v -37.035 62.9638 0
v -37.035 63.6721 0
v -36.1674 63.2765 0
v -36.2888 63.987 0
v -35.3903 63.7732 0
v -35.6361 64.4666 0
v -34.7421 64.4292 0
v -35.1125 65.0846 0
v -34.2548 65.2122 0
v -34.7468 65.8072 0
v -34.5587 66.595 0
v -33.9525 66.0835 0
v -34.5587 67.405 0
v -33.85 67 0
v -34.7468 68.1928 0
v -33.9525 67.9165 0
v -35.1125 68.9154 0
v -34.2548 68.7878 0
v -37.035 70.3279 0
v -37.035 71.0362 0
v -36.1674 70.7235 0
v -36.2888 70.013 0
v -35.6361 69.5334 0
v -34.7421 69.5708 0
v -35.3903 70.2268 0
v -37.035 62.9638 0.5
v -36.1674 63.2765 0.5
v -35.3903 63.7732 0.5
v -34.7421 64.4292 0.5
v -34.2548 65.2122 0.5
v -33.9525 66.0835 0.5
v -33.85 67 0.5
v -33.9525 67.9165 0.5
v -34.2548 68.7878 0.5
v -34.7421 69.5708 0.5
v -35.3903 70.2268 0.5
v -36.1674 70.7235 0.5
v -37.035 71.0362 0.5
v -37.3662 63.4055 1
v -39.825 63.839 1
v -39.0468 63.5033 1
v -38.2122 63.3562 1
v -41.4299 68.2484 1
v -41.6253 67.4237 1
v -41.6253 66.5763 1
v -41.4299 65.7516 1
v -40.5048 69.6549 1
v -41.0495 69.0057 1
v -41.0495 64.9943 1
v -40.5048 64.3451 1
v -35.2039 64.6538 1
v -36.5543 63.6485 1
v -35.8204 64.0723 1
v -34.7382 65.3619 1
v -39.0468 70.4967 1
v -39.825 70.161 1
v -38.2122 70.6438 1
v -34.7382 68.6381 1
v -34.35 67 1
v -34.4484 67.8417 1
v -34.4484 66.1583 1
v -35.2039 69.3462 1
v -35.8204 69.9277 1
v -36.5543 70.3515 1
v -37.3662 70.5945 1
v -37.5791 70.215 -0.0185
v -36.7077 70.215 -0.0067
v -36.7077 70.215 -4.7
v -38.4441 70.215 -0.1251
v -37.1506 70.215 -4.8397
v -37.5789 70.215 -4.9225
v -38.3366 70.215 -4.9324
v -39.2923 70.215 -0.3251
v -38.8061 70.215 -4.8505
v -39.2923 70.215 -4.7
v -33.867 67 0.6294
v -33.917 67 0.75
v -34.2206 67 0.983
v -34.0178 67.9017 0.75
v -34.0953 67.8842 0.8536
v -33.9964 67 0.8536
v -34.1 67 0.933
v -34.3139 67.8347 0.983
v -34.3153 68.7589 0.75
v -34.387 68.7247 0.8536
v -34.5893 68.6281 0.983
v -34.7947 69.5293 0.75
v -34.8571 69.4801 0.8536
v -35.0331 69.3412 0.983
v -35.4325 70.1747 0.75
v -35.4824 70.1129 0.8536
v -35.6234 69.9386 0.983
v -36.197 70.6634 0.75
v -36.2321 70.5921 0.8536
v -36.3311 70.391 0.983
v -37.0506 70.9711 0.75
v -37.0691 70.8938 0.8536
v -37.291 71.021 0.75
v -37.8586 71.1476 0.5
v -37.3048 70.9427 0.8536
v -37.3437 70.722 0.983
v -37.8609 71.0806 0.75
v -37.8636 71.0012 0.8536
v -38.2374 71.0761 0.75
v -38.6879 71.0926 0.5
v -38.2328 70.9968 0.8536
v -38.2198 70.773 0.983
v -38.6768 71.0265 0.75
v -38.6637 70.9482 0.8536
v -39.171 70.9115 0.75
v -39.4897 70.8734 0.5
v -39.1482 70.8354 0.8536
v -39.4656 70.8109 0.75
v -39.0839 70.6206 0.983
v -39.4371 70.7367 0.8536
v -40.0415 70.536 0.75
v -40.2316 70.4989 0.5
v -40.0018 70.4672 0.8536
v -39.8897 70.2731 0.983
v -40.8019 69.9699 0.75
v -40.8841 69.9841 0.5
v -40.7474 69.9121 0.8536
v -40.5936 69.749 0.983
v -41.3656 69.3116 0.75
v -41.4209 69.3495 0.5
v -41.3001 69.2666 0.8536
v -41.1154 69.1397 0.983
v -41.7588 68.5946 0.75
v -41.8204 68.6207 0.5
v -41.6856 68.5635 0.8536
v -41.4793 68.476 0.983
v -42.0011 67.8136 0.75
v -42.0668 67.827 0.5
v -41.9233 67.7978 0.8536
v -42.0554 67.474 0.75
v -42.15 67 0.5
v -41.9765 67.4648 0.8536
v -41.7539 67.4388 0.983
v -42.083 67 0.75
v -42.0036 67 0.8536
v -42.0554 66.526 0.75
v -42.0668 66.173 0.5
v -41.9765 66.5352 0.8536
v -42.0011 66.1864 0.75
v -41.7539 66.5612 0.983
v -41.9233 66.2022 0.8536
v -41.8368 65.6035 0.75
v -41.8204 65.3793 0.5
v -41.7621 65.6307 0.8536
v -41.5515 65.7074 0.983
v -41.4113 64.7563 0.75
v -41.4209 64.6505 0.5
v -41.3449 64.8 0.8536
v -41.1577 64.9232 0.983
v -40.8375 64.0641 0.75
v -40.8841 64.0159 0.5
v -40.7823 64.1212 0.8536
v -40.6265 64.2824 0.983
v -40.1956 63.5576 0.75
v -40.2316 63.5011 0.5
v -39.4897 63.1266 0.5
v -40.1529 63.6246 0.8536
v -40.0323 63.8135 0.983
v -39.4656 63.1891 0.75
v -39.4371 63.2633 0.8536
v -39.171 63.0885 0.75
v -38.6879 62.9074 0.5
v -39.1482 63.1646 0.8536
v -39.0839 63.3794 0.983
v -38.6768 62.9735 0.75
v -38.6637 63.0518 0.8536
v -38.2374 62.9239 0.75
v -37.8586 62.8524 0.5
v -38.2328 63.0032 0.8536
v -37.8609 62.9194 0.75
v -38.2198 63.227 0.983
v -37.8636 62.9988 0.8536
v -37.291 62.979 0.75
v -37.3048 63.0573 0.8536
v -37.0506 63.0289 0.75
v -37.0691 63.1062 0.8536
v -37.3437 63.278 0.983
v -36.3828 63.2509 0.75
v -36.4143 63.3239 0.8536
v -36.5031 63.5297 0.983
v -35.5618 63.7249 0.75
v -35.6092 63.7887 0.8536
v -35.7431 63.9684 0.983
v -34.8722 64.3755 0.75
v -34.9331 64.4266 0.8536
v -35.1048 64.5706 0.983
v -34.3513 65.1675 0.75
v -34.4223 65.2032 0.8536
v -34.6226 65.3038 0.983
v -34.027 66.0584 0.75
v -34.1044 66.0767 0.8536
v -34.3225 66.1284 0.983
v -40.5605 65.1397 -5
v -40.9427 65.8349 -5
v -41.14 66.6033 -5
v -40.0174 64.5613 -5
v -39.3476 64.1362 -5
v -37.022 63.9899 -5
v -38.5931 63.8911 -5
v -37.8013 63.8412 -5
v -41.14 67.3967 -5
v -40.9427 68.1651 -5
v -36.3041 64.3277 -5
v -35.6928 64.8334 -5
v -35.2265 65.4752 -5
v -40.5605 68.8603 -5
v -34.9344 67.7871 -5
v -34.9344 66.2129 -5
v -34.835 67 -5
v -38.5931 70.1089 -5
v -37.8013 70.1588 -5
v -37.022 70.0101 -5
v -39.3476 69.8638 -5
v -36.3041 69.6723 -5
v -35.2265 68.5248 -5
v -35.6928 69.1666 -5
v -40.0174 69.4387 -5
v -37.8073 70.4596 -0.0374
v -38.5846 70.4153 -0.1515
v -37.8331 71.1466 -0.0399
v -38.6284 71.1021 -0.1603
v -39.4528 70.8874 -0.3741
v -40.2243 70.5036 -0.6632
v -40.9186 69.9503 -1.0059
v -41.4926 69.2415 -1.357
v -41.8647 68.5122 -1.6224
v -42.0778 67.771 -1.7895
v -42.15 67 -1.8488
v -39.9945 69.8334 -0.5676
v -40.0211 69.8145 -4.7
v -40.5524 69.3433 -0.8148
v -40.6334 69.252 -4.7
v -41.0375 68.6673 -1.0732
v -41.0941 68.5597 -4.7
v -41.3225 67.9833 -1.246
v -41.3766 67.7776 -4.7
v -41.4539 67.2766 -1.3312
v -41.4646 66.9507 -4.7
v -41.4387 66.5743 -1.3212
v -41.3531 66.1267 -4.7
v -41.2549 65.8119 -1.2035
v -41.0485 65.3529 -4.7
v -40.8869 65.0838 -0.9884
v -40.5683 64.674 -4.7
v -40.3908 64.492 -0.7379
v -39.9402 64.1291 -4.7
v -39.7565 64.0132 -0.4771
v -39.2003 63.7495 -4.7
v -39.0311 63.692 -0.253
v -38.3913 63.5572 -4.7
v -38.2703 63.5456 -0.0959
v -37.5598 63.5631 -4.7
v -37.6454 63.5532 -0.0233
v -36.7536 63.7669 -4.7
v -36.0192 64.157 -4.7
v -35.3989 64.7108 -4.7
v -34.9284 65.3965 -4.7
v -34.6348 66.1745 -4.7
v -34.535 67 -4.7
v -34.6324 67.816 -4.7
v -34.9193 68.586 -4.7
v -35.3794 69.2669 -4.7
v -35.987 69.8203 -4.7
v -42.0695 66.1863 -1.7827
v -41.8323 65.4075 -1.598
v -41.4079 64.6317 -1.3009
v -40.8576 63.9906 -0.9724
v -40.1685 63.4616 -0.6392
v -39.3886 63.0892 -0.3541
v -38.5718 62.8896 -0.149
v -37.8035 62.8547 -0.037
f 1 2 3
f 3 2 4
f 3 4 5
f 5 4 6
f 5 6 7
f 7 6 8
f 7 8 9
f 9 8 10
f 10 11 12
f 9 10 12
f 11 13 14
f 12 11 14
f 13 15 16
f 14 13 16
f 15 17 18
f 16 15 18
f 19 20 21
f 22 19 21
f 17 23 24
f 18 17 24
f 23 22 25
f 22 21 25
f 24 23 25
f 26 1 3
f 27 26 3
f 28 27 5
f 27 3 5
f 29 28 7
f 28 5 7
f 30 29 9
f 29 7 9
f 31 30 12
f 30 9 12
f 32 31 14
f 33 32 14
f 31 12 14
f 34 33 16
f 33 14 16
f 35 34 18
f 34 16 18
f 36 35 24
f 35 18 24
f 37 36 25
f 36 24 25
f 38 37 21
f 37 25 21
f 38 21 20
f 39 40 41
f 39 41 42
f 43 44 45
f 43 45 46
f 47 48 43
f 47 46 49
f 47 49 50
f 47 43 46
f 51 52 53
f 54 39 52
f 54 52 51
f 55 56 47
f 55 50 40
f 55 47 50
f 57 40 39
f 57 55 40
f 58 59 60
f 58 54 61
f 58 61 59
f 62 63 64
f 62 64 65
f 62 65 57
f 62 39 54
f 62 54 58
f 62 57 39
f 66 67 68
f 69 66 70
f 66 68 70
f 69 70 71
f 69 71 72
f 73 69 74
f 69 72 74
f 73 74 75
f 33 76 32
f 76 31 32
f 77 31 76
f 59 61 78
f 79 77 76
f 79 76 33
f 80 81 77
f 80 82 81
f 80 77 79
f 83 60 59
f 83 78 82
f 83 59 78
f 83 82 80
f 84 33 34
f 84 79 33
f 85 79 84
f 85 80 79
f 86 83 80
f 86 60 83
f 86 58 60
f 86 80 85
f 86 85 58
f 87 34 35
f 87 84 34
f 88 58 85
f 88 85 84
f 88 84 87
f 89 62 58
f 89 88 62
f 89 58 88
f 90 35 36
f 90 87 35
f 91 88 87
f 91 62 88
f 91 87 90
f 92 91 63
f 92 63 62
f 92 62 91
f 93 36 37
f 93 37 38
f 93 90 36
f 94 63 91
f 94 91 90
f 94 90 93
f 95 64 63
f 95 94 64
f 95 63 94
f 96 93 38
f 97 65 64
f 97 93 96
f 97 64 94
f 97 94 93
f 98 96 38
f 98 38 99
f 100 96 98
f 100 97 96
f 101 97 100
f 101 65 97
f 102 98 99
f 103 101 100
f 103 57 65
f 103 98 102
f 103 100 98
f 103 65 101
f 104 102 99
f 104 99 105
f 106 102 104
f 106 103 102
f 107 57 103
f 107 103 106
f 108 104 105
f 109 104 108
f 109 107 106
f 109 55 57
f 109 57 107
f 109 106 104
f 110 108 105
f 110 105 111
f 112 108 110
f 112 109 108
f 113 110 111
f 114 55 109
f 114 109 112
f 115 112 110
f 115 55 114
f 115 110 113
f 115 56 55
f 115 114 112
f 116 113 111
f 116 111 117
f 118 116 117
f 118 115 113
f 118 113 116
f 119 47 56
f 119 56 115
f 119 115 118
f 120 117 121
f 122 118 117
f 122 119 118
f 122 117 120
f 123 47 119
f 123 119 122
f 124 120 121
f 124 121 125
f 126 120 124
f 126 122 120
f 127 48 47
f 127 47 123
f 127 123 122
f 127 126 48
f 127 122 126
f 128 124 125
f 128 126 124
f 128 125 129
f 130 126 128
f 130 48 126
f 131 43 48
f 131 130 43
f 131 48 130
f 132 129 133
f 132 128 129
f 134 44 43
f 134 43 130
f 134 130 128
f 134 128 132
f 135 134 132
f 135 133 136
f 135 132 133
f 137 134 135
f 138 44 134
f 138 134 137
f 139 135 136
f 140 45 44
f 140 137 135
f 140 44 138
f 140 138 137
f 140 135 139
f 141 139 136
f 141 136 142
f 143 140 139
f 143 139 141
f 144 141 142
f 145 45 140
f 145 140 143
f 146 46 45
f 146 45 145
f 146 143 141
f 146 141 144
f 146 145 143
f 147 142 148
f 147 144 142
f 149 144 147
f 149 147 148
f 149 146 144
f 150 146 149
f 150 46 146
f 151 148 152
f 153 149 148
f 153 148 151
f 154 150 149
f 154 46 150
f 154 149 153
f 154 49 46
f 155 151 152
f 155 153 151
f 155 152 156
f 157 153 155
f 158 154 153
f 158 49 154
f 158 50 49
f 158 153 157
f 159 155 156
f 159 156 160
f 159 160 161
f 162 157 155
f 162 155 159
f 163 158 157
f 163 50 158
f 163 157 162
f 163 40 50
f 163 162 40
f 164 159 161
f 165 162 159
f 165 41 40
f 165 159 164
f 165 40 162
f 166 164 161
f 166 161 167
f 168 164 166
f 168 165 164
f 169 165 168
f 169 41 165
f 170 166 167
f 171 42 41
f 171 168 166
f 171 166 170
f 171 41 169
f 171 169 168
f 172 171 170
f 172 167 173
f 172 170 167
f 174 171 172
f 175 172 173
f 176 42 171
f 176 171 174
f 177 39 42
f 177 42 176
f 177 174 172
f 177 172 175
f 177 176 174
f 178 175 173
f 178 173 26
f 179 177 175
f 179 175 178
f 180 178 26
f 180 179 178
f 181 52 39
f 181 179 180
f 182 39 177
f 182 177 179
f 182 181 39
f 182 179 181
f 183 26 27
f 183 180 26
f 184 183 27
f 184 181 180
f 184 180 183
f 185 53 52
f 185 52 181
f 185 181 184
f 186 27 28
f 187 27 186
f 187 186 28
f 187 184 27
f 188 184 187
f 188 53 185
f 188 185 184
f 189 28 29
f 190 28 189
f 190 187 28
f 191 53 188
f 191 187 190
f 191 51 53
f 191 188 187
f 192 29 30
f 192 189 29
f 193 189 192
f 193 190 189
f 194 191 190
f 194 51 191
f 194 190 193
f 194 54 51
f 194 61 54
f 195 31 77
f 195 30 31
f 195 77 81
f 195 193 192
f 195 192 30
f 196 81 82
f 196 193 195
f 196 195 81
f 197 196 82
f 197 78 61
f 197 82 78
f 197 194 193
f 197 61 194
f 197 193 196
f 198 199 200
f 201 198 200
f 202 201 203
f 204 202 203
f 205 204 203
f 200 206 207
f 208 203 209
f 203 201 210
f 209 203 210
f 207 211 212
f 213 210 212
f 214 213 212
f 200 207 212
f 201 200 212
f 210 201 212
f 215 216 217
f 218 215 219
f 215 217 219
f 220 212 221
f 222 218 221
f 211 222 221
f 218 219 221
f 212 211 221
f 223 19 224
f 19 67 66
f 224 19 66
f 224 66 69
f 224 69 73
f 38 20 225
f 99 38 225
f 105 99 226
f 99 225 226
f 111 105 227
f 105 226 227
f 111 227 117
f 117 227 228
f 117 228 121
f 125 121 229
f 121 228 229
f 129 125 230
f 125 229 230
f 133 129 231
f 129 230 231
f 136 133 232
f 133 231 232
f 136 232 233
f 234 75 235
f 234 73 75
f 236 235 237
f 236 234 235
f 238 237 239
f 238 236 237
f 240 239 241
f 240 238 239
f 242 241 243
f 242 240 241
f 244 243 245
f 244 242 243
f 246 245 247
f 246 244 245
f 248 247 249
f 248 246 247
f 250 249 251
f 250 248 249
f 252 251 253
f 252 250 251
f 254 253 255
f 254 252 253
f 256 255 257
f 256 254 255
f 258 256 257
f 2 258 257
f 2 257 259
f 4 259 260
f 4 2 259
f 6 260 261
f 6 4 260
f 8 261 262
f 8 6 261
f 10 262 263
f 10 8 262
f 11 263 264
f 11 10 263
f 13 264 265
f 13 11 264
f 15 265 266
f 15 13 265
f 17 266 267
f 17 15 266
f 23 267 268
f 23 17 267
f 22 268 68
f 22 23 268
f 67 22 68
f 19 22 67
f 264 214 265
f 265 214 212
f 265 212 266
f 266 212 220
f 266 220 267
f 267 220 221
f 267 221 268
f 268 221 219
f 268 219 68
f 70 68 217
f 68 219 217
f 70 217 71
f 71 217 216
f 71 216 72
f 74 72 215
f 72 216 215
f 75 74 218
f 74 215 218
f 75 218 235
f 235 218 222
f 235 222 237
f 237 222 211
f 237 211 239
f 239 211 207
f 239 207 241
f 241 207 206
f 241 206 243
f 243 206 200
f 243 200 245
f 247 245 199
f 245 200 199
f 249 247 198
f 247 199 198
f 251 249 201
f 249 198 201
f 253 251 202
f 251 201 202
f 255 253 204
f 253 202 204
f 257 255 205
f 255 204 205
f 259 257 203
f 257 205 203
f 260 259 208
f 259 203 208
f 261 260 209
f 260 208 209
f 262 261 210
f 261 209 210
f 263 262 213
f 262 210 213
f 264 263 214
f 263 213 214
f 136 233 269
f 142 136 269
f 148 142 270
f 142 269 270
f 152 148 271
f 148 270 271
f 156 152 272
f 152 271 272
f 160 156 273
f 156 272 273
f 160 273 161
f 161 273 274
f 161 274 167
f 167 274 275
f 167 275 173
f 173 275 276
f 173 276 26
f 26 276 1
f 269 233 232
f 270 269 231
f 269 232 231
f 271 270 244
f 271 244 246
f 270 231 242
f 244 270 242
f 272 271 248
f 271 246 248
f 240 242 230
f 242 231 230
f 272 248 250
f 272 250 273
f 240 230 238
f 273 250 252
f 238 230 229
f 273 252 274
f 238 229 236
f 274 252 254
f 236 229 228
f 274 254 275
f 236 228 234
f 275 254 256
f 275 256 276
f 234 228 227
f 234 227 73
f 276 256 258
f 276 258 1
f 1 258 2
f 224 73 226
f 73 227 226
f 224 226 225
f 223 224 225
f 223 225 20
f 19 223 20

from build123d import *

# Parameters (mm, degrees)
ESQUISSE1_R                  = 3.465
BOSS_EXTRU_1_DEPTH           = 5
ESQUISSE2_R                  = 4.15
BOSS_EXTRU_2_DEPTH           = 1
CONG_1_R                     = 0.5
BOSS_EXTRU_3_DEPTH           = 9
BOSS_EXTRU_3_DEPTH_BACK      = 2
ENL_V_START                  = -4
ENL_V_MAT_EXTRU_1_DEPTH      = 4
CHANFREIN1_SIZE              = 0.3
ENL_V_MAT_EXTRU_2_REACH      = 84.915
ENL_V_MAT_EXTRU_2_END_RADIUS = 8


with BuildPart() as part:
    # Esquisse1 → Boss.-Extru.1 (new body)
    with BuildSketch(Plane.XY):
        with Locations((-38, 67)):
            Circle(ESQUISSE1_R)
    extrude(amount=-BOSS_EXTRU_1_DEPTH)

    # Esquisse2 → Boss.-Extru.2 (add)
    with BuildSketch(Plane.XY):
        with Locations((-38, 67)):
            Circle(ESQUISSE2_R)
    extrude(amount=BOSS_EXTRU_2_DEPTH)

    # Congé1
    cong_1_edges = [part.edges().sort_by_distance(p)[0] for p in [
        (-42.15, 67, 1),
    ]]
    fillet(cong_1_edges, radius=CONG_1_R)

    # Esquisse4 → Boss.-Extru.3 (add, two sides: drawn at the far end of the back side and taken through both)
    with BuildSketch(Plane(origin=(29.785, 71.15, 0), x_dir=(0, 0, 1), z_dir=(0, -1, 0)).offset(-BOSS_EXTRU_3_DEPTH_BACK)):
        with BuildLine():
            Line((0, 71.935), (-1.84883954, 71.935))
            ThreePointArc((-1.84883954, 71.935), (-0.476394359, 69.539440781), (0, 66.82))
            Line((0, 66.82), (0, 71.935))
        make_face()
    extrude(amount=BOSS_EXTRU_3_DEPTH + BOSS_EXTRU_3_DEPTH_BACK)

    # Esquisse5 → Enlèv. mat.-Extru.1 (cut)
    with BuildSketch(Plane.XY.offset(1).offset(ENL_V_START)):
        with BuildLine():
            Line((-37.035, 62.963754839), (-36.628505561, 58.672971398))
            Line((-36.628505561, 58.672971398), (-43.808246532, 59.466119951))
            Line((-43.808246532, 59.466119951), (-42.997006725, 73.486489438))
            Line((-42.997006725, 73.486489438), (-36.628505561, 73.524507843))
            Line((-36.628505561, 73.524507843), (-37.035, 71.036245161))
            ThreePointArc((-37.035, 71.036245161), (-40.57077323, 70.25785589), (-42.15, 67))
            ThreePointArc((-42.15, 67), (-40.57077323, 63.74214411), (-37.035, 62.963754839))
        make_face()
    extrude(amount=ENL_V_MAT_EXTRU_1_DEPTH, mode=Mode.SUBTRACT)

    # Chanfrein1
    chanfrein1_edges = [part.edges().sort_by_distance(p)[0] for p in [
        (-41.465, 67, -5),
    ]]
    chamfer(chanfrein1_edges, length=CHANFREIN1_SIZE)

    # Enlèv. mat.-Extru.2: up to this cylinder (the profile starts inside it)
    enl_v_mat_extru_2_end = Plane(origin=(-37.035, 70.315316, -8), z_dir=(0, -1, 0)) * Cylinder(ENL_V_MAT_EXTRU_2_END_RADIUS, 186.83, mode=Mode.PRIVATE)
    # Esquisse7 → Enlèv. mat.-Extru.2 (cut, up to the surface)
    with BuildSketch(Plane(origin=(0, 0, -5), x_dir=(-1, 0, 0), z_dir=(0, 0, -1)), mode=Mode.PRIVATE) as enl_v_mat_extru_2_sk1:
        with BuildLine():
            Line((36.707715202, 70.215), (39.292284798, 70.215))
            ThreePointArc((39.292284798, 70.215), (38.173107277, 70.460673182), (37.035, 70.327912258))
            ThreePointArc((37.035, 70.327912258), (36.869946479, 70.275546373), (36.707715202, 70.215))
        make_face()
    enl_v_mat_extru_2_tool1 = extrude(enl_v_mat_extru_2_sk1.sketch, amount=-ENL_V_MAT_EXTRU_2_REACH, mode=Mode.PRIVATE) & enl_v_mat_extru_2_end
    add(enl_v_mat_extru_2_tool1.solids().sort_by_distance((-38, 70.315316, -5))[0], mode=Mode.SUBTRACT)


solid = part.part
